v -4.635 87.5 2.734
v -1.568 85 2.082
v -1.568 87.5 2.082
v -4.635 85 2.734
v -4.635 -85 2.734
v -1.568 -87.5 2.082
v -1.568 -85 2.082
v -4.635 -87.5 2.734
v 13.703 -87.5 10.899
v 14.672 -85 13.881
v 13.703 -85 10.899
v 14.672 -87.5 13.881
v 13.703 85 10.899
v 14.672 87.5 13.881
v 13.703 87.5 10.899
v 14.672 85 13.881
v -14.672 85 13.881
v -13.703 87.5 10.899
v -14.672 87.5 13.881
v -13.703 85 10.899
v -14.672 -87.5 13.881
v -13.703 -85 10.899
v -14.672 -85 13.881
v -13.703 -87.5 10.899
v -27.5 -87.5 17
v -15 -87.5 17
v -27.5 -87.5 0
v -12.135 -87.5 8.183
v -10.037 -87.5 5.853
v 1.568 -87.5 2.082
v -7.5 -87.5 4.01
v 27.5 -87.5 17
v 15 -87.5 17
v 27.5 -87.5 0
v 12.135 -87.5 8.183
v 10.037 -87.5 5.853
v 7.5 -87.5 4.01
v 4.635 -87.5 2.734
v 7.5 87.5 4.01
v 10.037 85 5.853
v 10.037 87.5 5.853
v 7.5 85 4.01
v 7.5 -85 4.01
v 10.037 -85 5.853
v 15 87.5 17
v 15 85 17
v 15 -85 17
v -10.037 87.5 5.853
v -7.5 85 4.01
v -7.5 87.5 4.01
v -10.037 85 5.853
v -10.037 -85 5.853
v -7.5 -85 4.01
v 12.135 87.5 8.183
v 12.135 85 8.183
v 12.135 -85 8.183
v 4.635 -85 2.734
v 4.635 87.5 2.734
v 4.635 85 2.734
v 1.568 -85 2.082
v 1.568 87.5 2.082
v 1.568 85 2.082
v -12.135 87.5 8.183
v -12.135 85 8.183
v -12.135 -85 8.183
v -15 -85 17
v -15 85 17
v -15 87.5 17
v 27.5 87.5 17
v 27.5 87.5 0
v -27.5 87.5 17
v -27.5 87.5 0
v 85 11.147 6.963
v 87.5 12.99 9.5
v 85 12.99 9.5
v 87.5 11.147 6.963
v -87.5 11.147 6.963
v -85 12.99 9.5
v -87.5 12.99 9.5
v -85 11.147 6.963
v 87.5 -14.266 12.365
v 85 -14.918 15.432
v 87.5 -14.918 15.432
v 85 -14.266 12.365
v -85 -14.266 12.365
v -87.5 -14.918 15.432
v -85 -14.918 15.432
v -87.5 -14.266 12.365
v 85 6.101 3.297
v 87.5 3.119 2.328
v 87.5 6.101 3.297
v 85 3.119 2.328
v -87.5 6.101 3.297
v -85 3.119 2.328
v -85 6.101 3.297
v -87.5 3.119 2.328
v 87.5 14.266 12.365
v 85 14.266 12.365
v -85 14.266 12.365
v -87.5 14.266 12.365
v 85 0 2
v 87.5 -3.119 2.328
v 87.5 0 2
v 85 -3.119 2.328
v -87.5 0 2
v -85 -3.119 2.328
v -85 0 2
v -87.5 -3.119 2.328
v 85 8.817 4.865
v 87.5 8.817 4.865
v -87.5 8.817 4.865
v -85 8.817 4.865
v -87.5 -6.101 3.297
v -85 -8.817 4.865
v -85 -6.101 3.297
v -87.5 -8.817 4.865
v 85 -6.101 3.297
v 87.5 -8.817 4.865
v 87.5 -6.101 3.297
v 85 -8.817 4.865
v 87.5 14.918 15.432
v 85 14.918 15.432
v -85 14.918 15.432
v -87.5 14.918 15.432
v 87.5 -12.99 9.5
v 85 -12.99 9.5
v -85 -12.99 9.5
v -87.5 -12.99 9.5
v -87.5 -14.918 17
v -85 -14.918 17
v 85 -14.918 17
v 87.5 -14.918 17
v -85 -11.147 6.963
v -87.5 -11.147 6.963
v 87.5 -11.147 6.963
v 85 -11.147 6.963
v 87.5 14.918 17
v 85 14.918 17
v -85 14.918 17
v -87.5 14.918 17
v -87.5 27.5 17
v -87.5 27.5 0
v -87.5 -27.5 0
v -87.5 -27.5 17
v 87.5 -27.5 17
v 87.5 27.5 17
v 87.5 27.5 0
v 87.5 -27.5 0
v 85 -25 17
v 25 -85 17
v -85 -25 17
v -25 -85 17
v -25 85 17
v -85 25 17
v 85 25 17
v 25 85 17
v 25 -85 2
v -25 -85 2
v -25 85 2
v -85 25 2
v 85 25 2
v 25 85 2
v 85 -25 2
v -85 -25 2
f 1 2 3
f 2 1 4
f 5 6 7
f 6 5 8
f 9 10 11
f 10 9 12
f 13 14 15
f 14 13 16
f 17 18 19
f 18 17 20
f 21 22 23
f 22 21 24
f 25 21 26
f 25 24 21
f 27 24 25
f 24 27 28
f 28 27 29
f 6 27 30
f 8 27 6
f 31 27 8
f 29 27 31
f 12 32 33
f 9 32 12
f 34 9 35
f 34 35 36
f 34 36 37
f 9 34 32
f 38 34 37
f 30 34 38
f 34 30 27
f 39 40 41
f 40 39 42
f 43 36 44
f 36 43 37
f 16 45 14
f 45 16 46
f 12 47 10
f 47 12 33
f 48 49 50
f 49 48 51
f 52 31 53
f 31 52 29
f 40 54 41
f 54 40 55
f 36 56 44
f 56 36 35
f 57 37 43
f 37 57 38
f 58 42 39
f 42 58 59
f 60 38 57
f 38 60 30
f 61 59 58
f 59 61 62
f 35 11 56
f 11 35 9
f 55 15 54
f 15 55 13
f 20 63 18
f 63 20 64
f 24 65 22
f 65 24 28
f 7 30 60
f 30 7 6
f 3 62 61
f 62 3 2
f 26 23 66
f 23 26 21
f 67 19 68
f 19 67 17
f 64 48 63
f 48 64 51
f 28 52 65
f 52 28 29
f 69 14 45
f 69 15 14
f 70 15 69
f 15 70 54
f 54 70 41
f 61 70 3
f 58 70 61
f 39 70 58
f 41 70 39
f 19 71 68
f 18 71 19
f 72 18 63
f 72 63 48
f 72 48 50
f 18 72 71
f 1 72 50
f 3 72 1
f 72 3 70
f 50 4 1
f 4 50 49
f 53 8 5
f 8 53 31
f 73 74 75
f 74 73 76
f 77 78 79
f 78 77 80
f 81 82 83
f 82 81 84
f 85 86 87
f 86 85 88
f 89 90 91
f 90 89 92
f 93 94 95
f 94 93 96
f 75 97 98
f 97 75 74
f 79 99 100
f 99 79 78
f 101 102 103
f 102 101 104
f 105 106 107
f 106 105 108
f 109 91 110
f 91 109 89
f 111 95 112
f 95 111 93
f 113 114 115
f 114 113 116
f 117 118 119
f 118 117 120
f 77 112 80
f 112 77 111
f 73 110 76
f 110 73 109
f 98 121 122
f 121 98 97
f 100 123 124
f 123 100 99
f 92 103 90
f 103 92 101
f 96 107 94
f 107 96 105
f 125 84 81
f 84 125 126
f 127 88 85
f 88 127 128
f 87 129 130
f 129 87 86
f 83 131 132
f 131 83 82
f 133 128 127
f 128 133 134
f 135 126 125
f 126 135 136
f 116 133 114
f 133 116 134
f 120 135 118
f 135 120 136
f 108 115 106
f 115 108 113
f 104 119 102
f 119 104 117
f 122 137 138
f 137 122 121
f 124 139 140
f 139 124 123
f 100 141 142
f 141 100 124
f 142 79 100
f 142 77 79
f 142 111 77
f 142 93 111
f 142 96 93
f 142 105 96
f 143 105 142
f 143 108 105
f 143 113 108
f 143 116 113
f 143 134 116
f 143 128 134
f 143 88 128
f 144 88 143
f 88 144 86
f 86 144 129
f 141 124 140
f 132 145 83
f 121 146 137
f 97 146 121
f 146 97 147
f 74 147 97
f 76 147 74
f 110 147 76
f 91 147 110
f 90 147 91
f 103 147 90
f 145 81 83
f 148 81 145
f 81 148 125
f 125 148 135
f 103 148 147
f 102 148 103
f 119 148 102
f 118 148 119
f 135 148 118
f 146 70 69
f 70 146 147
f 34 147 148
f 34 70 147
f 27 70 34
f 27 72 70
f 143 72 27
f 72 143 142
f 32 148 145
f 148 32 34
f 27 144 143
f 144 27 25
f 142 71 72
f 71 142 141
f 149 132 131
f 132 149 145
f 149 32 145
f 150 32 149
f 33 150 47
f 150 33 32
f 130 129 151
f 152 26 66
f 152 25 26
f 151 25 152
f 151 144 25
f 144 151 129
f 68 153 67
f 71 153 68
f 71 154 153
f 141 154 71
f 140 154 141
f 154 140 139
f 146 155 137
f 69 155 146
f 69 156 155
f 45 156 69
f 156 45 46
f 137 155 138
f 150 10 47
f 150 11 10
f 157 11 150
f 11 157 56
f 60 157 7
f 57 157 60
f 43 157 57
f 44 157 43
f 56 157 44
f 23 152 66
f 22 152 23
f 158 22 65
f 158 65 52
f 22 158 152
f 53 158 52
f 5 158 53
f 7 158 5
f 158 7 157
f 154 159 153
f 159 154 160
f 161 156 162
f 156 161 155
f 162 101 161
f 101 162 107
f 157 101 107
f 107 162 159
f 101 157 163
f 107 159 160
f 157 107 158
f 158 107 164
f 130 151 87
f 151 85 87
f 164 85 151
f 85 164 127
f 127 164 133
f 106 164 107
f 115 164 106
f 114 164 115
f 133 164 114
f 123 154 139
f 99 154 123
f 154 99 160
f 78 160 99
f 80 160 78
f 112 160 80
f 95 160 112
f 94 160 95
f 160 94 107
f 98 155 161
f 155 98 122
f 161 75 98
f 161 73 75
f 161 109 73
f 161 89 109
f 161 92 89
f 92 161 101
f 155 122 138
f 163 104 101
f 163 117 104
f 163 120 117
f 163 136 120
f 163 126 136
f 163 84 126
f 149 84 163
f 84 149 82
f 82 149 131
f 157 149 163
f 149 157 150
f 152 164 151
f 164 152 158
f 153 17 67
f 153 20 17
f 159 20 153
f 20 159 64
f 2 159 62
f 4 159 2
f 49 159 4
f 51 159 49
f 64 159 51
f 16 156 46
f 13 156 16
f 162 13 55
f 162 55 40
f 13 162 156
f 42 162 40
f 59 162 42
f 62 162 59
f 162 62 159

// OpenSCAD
$fieldDiameter=10;
$fieldSeparator=5;
$boardHeight=7;
$fieldDepth=5;
$homeHeight=3;
$boardOffset=2.5;
$lidHeight=2;

module shape(x_dist, y_dist, h) {
polyhedron(points=[
[-x_dist, -y_dist, 0],
[-x_dist, y_dist, 0],
[-y_dist, x_dist, 0],
[y_dist, x_dist, 0],
[x_dist, y_dist, 0],
[x_dist, -y_dist, 0],
[y_dist, -x_dist, 0],
[-y_dist, -x_dist, 0],
[-x_dist, -y_dist, h],
[-x_dist, y_dist, h],
[-y_dist, x_dist, h],
[y_dist, x_dist, h],
[x_dist, y_dist, h],
[x_dist, -y_dist, h],
[y_dist, -x_dist, h],
[-y_dist, -x_dist, h]
], faces=[
[7, 6, 5, 4, 3, 2, 1, 0],
[8, 9, 10, 11, 12, 13, 14, 15],
[0, 1, 9, 8],
[1, 2, 10, 9],
[2, 3, 11, 10],
[3, 4, 12, 11],
[4, 5, 13, 12],
[5, 6, 14, 13],
[6, 7, 15, 14],
[7, 0, 8, 15]
]);
}

module lid() {
x_dist = $fieldDiameter*5.5+$fieldSeparator*6;
y_dist = $fieldDiameter*1.5+$fieldSeparator*2;

h=$boardHeight+10;

difference() {
shape(x_dist+$boardOffset, y_dist+$boardOffset, h);
translate([0,0,$lidHeight]) shape(x_dist, y_dist, h-$lidHeight);

translate([0, 0, h]) {
rotate([90, 0, 0])
cylinder(h=x_dist*2+$boardOffset*2, r=h-($boardHeight-$fieldDepth), center=true);
rotate([0, 90, 0])
cylinder(h=x_dist*2+$boardOffset*2, r=h-($boardHeight-$fieldDepth), center=true);
}

}
}

lid();
